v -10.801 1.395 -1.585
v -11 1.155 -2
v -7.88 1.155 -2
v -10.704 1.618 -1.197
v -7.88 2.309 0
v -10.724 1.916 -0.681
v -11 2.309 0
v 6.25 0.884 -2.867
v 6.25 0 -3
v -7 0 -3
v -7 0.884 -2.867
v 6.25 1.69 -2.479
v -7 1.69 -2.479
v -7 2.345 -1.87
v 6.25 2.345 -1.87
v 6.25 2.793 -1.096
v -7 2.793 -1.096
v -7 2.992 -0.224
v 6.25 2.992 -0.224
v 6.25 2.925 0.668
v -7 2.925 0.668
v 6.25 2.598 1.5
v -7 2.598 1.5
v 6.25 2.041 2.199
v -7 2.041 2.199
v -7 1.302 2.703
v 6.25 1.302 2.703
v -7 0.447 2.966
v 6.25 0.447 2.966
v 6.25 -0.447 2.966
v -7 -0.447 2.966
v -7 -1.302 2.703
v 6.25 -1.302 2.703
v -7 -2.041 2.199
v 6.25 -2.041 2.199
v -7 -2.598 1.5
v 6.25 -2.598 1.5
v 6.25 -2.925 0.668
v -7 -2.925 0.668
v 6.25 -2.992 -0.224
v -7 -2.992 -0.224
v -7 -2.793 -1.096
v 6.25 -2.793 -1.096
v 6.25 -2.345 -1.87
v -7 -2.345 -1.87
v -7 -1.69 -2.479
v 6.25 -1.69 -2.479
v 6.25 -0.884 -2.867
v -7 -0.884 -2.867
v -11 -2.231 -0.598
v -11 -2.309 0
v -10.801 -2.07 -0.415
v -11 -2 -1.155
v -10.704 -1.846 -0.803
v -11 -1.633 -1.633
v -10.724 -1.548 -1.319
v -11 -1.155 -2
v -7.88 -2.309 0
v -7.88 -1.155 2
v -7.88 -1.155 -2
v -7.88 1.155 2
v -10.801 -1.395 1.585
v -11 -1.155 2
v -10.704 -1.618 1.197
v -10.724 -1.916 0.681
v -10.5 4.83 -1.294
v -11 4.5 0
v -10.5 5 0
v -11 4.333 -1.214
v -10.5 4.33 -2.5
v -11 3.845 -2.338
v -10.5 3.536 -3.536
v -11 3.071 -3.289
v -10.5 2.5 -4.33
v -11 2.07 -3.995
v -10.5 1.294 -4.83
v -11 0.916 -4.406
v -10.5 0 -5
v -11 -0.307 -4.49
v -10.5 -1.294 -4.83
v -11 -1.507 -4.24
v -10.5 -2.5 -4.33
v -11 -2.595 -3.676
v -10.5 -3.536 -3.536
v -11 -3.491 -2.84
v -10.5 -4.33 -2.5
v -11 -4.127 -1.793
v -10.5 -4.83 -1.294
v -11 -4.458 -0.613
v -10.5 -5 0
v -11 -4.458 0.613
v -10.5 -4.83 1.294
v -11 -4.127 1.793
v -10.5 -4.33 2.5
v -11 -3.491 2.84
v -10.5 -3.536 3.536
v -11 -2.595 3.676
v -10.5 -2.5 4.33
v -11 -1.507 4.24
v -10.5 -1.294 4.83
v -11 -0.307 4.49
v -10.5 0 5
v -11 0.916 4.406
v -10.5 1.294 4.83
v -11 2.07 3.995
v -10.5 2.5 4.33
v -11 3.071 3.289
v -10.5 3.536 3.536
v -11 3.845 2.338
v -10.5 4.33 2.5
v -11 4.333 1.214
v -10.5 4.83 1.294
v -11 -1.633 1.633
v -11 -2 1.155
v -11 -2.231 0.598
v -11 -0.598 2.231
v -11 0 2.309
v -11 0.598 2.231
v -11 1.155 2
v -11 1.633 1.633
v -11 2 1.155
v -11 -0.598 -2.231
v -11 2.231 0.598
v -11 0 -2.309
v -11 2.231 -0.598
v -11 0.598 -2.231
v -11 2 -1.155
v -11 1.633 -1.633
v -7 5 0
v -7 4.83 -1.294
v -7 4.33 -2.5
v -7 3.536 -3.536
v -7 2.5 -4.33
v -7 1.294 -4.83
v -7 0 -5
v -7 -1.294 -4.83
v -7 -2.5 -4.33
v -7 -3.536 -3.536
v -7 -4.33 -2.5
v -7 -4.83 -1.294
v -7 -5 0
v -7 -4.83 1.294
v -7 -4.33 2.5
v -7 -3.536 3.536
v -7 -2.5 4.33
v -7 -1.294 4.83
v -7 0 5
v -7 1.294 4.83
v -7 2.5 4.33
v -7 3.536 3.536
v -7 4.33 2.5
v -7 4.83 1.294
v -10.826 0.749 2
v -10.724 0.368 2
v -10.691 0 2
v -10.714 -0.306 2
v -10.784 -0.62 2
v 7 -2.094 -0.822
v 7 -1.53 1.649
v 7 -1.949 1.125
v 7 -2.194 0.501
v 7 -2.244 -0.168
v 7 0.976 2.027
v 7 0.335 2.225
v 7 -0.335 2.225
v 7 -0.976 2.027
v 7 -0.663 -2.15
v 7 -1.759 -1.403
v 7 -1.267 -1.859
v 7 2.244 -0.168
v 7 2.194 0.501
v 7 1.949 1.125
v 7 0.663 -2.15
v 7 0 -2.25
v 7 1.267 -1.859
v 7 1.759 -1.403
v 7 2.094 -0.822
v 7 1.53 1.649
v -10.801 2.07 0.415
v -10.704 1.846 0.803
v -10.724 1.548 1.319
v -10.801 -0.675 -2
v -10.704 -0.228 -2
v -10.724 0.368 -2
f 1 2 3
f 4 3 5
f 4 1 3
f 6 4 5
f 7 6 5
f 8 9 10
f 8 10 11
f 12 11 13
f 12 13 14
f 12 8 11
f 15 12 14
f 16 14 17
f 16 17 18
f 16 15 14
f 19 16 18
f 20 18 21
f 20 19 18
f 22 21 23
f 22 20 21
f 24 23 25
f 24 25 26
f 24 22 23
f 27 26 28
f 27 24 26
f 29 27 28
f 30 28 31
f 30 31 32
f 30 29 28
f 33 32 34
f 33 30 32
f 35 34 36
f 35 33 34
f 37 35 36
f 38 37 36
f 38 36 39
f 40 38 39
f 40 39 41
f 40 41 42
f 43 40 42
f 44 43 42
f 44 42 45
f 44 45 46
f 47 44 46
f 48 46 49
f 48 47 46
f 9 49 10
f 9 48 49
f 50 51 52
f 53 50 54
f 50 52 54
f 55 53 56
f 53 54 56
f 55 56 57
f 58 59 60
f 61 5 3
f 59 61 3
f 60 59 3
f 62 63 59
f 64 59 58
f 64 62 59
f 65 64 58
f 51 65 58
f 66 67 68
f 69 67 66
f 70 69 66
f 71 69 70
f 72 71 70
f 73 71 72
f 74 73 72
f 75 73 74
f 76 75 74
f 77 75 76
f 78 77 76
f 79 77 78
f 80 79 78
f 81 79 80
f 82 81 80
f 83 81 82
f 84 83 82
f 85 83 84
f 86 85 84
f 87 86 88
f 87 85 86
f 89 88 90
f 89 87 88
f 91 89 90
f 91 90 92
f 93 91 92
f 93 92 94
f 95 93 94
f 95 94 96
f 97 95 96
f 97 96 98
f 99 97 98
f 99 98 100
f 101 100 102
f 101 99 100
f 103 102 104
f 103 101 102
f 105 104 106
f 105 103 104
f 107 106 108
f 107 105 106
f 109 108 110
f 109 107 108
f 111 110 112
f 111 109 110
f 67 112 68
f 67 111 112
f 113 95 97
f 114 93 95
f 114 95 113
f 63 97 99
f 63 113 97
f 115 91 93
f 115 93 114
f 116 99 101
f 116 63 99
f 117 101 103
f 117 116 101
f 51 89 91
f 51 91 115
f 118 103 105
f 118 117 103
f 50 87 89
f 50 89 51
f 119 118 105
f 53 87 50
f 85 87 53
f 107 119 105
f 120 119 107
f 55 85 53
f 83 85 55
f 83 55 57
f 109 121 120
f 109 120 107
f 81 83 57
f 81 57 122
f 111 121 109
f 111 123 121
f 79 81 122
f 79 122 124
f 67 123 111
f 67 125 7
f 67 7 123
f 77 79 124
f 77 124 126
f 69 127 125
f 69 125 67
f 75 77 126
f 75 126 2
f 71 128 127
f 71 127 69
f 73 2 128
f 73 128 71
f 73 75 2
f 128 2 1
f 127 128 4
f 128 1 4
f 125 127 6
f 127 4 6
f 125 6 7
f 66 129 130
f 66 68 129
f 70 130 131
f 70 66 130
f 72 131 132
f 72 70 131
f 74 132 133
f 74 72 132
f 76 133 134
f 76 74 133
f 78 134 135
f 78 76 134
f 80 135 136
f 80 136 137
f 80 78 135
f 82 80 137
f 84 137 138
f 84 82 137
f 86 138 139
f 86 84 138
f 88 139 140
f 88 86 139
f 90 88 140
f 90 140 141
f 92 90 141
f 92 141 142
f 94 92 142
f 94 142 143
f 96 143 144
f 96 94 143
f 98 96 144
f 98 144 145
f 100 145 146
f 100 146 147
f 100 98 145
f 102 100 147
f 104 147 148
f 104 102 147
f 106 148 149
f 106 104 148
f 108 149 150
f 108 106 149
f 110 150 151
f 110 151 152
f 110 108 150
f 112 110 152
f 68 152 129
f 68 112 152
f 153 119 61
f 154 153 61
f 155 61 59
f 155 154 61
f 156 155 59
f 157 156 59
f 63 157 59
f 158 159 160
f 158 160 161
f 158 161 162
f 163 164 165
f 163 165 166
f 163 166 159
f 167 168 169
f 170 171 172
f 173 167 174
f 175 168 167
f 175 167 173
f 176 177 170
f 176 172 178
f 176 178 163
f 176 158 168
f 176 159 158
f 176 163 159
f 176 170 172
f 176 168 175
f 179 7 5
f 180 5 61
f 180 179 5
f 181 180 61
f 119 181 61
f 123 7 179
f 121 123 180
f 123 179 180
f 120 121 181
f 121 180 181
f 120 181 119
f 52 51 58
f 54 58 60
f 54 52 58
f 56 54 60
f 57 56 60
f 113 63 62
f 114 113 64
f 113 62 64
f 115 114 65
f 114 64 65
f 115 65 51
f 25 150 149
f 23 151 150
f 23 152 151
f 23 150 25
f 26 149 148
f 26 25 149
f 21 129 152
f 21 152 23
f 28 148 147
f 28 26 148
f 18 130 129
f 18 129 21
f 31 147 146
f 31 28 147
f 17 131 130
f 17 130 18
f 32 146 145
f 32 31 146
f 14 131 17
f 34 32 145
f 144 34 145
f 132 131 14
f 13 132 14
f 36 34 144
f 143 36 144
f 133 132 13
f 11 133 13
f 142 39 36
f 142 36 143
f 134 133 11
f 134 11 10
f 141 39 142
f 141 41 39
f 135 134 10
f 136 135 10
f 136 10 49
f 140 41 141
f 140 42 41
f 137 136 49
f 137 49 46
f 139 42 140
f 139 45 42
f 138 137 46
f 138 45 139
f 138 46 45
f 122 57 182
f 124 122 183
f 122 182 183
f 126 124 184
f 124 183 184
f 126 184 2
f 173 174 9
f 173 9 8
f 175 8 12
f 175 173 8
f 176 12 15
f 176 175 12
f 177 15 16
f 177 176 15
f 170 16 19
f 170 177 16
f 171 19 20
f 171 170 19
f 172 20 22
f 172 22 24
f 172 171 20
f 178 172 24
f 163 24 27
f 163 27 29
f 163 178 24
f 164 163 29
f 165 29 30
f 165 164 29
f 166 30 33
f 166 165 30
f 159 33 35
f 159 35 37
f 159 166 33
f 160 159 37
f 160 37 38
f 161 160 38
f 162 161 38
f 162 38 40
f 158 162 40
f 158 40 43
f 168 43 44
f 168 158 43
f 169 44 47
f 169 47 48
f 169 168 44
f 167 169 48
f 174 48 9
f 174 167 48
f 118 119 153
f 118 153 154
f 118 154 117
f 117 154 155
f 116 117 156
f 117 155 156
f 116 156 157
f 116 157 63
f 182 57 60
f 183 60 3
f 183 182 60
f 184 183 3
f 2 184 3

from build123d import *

# Parameters (mm, degrees)
SKETCH2_R           = 3
BOSS_EXTRUDE1_DEPTH = 14
CHAMFER1_SIZE       = 0.75
CUT_EXTRUDE1_DEPTH  = 3.12


with BuildPart() as part:
    # Sketch2 → Boss-Extrude1 (new body)
    with BuildSketch(Plane(origin=(7, 0, 0), x_dir=(0, 0, -1), z_dir=(1, 0, 0))):
        Circle(SKETCH2_R)
    extrude(amount=-BOSS_EXTRUDE1_DEPTH)

    # Chamfer1
    chamfer1_edges = [part.edges().sort_by_distance(p)[0] for p in [
        (7, 0, 3),
    ]]
    chamfer(chamfer1_edges, length=CHAMFER1_SIZE)

    # Sketch6 → Revolve1 (revolve)
    with BuildSketch(Plane.XY):
        Polygon((-10.5, 5), (-11, 4.5), (-11, 0), (-7, 0), (-7, 5), align=None)
    revolve(axis=Axis((-7, 0, 0), (-1, 0, 0)))

    # Sketch4 → Cut-Extrude1 (cut)
    with BuildSketch(Plane(origin=(-11, 0, 0), x_dir=(0, 0, -1), z_dir=(1, 0, 0))):
        Polygon((0, 2.309401077), (-2, 1.154700538), (-2, -1.154700538), (0, -2.309401077), (2, -1.154700538), (2, 1.154700538), align=None)
    extrude(amount=CUT_EXTRUDE1_DEPTH, mode=Mode.SUBTRACT)

    # Cut-Extrude2 cone 1 section (through the dimple's axis) → Cut-Extrude2 (revolve, cut)
    with BuildSketch(Plane(origin=(-11, 0, 0), x_dir=(0, 0, 1), z_dir=(0, 1, 0))):
        Polygon((0, 0), (2.309401077, 0), (0, 2.309401077), align=None)
    revolve(axis=Axis((-11, 0, 0), (1, 0, 0)), mode=Mode.SUBTRACT)


solid = part.part
